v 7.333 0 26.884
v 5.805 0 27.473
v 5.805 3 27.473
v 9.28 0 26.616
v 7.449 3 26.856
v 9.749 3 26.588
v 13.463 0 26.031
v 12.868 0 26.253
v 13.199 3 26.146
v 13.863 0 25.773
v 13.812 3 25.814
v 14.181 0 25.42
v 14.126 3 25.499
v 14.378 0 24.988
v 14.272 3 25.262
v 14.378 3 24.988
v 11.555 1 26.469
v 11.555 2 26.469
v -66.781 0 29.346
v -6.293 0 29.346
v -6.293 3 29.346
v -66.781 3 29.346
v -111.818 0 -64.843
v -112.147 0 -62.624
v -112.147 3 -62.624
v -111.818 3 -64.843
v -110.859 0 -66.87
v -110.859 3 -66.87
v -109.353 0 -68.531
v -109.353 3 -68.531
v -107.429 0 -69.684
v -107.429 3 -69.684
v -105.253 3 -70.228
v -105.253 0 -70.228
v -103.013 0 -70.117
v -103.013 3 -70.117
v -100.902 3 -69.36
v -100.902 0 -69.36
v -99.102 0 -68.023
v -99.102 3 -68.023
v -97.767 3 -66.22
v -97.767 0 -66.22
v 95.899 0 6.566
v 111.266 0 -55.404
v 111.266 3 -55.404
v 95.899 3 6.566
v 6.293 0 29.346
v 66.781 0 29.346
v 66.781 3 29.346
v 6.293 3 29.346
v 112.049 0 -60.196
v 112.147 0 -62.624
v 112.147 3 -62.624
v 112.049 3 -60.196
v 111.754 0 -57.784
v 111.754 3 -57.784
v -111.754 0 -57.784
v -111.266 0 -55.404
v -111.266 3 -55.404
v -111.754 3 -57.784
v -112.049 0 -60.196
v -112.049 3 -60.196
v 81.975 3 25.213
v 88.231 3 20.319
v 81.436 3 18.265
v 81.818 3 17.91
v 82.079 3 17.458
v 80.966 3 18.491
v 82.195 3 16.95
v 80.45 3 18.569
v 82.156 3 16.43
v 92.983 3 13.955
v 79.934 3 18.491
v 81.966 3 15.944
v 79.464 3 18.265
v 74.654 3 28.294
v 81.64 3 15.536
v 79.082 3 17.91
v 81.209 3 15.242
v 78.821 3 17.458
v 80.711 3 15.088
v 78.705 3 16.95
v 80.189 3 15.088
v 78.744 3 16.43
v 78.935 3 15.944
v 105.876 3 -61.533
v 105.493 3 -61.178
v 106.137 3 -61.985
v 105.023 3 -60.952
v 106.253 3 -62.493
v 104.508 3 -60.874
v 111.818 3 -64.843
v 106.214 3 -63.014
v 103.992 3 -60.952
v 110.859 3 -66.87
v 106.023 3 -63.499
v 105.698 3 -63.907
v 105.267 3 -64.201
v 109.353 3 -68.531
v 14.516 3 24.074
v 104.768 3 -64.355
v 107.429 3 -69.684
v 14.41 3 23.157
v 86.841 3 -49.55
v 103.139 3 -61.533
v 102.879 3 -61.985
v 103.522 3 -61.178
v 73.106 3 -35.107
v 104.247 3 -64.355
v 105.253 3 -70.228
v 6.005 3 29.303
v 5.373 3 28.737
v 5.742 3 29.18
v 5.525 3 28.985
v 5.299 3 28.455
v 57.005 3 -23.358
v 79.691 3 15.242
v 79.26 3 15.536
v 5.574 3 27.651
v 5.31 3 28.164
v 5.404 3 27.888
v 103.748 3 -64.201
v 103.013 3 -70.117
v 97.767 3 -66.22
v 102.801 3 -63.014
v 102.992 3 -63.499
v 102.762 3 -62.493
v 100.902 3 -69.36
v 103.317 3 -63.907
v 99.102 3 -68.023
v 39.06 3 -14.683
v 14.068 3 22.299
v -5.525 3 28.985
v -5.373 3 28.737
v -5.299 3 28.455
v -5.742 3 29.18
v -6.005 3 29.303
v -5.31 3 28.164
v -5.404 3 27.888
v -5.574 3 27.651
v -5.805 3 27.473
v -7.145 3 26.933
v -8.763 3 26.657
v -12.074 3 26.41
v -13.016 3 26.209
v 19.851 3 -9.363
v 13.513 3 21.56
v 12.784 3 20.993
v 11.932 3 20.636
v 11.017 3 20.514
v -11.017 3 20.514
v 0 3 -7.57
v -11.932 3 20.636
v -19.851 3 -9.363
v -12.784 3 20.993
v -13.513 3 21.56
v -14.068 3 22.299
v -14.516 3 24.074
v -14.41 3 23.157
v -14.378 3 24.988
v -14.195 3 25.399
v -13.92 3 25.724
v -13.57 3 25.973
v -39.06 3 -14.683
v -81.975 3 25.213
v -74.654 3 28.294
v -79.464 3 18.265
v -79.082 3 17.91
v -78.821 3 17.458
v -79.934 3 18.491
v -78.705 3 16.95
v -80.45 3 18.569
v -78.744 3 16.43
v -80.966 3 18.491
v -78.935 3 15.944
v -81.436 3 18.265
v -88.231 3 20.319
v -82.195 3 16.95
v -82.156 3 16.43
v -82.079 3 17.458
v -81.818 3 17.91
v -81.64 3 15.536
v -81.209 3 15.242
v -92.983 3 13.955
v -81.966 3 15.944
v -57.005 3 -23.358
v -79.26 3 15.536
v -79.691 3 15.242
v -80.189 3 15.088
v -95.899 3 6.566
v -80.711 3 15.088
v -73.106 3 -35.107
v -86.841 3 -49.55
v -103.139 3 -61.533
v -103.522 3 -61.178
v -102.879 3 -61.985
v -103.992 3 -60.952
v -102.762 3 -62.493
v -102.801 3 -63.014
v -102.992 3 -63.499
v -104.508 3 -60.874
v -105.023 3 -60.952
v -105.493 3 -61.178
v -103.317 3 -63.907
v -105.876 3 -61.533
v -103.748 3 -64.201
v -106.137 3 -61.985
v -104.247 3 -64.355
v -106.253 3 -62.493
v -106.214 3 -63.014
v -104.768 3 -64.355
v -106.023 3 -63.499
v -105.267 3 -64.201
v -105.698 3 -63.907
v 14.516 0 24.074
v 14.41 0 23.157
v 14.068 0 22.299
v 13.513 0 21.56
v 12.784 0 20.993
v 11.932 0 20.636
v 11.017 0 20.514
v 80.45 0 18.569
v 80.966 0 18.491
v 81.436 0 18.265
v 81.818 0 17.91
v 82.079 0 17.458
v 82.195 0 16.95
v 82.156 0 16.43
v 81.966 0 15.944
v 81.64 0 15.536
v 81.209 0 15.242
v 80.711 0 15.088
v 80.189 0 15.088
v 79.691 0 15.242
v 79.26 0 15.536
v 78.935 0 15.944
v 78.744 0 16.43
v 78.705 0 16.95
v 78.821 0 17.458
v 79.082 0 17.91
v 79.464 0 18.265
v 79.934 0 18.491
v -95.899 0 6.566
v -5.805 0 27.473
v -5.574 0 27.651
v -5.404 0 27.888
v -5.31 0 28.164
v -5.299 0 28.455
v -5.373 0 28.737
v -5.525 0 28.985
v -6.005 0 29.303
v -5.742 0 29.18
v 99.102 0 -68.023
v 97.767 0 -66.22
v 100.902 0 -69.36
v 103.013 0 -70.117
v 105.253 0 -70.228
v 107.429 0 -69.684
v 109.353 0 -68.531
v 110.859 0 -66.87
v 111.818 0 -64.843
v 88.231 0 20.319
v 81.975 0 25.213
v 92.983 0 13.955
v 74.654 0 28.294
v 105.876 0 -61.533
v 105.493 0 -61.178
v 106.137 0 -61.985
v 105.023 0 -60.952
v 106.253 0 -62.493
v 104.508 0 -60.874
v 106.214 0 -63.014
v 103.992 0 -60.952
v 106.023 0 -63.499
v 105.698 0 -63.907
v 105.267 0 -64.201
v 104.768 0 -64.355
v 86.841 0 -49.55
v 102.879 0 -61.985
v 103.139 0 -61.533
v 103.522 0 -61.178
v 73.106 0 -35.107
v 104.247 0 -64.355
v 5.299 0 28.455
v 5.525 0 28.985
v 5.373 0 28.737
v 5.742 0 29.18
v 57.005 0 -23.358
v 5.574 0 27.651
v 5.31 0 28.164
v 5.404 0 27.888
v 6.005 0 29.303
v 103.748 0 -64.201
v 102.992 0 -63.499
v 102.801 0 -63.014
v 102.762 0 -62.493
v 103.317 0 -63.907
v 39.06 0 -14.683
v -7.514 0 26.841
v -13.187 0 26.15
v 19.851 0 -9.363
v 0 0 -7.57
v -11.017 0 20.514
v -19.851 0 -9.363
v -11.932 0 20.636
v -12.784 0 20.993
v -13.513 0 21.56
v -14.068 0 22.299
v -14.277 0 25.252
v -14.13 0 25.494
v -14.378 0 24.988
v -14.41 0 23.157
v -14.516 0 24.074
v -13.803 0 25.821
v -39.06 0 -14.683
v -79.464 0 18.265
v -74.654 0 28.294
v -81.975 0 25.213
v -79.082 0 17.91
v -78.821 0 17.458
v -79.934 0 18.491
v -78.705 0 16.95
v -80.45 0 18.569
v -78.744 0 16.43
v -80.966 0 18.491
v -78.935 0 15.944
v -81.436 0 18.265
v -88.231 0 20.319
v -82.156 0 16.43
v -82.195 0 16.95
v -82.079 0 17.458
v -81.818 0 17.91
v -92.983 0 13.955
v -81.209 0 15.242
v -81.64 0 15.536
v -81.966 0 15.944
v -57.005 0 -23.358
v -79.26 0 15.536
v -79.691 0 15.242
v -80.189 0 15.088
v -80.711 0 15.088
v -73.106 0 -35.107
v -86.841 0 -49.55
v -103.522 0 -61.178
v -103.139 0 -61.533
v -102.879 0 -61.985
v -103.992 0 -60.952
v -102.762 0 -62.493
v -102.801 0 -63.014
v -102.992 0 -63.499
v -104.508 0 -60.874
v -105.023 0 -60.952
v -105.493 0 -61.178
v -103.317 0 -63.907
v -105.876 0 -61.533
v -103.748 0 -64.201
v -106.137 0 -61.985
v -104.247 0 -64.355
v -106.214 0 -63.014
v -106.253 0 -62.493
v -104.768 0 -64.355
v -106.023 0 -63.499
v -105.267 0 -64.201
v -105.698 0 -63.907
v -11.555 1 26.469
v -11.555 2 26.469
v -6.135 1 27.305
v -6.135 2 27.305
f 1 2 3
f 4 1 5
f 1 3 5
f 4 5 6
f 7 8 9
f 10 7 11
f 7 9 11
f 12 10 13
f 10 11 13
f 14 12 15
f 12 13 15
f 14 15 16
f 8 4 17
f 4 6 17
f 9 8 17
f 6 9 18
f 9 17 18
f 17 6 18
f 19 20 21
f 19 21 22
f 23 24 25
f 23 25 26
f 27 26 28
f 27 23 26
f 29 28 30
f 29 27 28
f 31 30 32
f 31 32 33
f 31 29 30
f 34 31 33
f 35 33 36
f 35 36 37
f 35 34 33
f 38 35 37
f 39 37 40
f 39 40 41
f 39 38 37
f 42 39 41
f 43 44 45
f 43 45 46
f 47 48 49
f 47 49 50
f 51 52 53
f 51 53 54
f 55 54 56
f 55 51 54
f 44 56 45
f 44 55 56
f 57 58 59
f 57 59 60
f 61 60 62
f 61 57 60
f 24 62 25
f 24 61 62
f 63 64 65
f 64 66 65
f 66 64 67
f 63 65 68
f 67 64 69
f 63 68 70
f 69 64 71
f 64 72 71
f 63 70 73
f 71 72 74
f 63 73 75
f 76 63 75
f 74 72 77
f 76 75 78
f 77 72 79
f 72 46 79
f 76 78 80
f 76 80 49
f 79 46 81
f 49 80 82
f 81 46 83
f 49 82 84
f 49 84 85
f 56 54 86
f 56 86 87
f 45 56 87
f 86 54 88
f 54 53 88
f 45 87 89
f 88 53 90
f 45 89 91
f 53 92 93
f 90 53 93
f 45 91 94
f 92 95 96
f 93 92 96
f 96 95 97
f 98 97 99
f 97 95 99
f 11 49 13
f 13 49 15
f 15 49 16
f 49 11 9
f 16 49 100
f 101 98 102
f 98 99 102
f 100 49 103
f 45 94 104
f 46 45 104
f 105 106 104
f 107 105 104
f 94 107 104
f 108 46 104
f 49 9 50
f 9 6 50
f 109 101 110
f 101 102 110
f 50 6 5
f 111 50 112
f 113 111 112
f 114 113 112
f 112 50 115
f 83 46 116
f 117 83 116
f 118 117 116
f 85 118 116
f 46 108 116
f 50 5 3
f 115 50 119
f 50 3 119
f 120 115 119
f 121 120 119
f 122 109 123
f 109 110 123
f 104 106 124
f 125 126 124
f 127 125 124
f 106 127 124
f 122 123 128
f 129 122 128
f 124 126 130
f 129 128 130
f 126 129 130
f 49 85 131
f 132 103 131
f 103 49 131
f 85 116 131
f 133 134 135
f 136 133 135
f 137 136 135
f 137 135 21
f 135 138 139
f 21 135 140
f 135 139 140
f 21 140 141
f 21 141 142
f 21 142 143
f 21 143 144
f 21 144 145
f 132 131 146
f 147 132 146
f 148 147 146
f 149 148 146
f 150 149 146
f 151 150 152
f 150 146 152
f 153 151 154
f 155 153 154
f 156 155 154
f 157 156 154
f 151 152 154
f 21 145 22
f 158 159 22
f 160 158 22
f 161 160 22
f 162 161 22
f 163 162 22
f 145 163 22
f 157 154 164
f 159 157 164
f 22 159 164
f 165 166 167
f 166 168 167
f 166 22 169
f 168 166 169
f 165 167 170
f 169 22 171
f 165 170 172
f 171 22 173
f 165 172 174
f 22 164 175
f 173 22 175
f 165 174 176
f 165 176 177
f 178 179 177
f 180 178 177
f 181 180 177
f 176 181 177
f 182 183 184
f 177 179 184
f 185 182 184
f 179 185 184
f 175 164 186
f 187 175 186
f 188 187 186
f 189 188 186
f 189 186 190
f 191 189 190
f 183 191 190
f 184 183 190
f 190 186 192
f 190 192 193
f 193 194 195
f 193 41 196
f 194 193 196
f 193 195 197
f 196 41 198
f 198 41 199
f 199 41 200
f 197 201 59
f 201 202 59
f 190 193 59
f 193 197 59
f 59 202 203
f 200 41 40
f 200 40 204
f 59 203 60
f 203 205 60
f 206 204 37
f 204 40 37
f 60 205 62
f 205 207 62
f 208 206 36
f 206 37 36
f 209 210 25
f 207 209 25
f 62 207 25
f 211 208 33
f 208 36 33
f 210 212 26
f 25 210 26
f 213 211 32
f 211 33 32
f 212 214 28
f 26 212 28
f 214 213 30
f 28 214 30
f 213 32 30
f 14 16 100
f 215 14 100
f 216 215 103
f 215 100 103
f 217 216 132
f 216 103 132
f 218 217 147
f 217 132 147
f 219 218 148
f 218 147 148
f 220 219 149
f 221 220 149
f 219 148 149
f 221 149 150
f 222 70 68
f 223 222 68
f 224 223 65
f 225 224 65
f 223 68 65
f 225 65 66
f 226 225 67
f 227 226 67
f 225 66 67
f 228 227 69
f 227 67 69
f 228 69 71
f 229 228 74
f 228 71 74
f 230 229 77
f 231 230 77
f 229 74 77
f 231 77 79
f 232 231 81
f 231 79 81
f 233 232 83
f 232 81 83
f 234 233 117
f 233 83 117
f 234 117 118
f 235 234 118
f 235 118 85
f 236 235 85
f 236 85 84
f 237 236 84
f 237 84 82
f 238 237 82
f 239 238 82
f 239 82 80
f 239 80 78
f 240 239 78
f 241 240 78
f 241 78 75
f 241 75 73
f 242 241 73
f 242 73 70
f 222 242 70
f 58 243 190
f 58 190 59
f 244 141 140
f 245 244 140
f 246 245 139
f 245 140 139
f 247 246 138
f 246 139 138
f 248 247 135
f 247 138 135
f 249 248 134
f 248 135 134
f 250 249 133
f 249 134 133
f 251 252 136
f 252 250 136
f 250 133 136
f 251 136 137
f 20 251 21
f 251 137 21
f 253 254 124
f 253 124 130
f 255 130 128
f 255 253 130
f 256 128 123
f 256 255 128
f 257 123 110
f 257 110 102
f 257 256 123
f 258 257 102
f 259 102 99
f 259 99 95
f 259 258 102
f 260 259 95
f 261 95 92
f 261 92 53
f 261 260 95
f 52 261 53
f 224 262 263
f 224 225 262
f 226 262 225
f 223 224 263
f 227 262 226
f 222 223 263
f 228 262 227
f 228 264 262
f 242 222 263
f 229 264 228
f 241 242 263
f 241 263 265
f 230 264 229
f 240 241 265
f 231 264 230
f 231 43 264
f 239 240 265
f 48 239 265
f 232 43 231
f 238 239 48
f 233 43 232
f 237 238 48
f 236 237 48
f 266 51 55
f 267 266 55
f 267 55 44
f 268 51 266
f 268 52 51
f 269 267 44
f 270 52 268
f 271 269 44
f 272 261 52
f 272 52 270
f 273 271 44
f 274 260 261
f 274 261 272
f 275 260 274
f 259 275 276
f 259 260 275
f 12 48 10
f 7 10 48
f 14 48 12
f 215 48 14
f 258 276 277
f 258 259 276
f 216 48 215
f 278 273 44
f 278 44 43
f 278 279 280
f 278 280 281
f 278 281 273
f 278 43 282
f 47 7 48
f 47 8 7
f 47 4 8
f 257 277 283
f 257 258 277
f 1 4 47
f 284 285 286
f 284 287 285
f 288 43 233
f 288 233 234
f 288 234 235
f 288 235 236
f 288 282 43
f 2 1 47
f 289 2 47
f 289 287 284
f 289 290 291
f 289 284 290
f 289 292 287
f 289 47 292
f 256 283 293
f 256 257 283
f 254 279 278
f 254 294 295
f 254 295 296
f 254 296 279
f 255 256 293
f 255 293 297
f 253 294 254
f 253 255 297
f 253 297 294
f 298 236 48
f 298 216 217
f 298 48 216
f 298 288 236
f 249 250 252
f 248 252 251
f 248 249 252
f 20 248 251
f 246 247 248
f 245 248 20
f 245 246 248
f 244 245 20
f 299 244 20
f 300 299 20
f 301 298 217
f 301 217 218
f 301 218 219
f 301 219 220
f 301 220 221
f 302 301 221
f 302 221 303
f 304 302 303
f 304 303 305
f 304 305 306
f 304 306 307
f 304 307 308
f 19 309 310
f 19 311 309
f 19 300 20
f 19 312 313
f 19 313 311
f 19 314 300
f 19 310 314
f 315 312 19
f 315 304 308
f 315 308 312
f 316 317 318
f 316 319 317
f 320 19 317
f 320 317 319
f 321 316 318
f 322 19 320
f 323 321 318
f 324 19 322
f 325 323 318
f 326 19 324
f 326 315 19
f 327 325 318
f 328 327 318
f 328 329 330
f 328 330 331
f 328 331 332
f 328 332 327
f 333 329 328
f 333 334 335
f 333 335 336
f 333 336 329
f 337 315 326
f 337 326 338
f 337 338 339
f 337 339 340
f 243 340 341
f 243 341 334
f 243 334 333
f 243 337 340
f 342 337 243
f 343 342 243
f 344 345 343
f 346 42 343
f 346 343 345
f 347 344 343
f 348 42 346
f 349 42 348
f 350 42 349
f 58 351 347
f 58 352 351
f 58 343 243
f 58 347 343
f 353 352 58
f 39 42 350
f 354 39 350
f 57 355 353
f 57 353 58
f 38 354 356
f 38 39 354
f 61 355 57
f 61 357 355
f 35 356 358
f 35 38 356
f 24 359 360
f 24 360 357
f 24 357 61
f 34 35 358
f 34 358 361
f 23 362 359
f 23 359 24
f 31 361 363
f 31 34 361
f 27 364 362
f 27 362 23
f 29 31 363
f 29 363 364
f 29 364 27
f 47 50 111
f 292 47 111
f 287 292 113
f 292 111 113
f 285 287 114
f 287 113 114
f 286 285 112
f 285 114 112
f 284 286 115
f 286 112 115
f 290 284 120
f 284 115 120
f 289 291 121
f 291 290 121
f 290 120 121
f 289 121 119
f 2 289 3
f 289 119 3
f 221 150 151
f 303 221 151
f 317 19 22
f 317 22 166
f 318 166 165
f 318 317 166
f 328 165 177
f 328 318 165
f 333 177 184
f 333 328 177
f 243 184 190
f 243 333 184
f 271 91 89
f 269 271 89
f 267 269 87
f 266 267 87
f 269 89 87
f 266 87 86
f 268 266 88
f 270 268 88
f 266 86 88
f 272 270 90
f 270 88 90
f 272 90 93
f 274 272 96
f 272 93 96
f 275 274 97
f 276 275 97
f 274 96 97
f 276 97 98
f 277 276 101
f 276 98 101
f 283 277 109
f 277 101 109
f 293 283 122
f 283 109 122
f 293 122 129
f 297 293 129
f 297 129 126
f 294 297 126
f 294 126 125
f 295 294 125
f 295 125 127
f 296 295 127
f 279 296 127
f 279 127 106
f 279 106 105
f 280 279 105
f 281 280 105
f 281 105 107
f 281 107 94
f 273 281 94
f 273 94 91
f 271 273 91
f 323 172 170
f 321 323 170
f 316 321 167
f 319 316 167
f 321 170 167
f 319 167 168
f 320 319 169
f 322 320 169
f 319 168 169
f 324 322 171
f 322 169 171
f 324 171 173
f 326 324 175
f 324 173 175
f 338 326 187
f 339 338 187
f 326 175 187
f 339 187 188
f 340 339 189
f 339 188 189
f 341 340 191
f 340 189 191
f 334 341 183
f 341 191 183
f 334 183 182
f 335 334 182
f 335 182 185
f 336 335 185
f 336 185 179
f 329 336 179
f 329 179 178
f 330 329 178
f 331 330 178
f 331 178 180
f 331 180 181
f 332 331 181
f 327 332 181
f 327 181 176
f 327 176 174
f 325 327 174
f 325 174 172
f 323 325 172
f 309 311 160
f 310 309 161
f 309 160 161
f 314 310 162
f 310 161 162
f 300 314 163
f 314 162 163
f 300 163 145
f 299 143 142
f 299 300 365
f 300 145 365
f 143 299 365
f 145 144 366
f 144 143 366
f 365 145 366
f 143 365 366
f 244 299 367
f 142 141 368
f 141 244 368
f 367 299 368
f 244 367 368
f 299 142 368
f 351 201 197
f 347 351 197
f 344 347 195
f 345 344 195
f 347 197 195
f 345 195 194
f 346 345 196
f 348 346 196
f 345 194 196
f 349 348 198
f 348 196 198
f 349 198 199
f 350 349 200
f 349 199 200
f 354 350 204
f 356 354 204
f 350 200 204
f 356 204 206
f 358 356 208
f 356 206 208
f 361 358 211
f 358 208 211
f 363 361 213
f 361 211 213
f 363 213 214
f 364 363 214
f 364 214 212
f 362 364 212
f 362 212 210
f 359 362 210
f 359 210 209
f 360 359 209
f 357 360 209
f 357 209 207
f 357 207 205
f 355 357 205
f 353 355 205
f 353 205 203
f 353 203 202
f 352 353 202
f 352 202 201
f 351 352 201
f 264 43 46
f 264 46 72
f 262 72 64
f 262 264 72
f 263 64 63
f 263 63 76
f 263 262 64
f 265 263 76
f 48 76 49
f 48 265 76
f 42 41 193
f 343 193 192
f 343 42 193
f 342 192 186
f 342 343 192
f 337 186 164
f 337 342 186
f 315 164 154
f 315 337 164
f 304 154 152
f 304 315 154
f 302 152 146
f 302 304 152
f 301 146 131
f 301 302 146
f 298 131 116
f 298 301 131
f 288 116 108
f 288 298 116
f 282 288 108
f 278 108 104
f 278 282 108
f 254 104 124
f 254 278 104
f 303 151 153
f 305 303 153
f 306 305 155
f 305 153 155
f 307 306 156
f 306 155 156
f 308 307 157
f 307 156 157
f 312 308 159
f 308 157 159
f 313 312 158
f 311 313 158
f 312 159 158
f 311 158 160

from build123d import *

# Parameters (mm, degrees)
EXTRUDE_1_DEPTH     = 3
CUT_EXTRUDE_START   = -10
CUT_EXTRUDE_1_DEPTH = 10
SKETCH_3_R          = 1.75
CUT_EXTRUDE_2_DEPTH = 10
CUT_EXTRUDE_3_DEPTH = 10


with BuildPart() as part:
    # 草图1 → 凸台-拉伸1 (new body)
    with BuildSketch(Plane(origin=(0, 0, 0), x_dir=(1, 0, 0), z_dir=(0, 1, 0))):
        with BuildLine():
            Line((-66.78059141, 154.593992167), (66.78059141, 154.593992167))
            ThreePointArc((66.78059141, 154.593992167), (85.265515034, 148.222525736), (95.898700635, 131.814498742))
            Line((95.898700635, 131.814498742), (111.265547961, 69.844672358))
            ThreePointArc((111.265547961, 69.844672358), (112.147438737, 62.624165782), (111.265547961, 55.403659207))
            Line((111.265547961, 55.403659207), (95.898700635, -6.566167178))
            ThreePointArc((95.898700635, -6.566167178), (85.265515034, -22.974194171), (66.78059141, -29.345660602))
            Line((66.78059141, -29.345660602), (-66.78059141, -29.345660602))
            ThreePointArc((-66.78059141, -29.345660602), (-85.265515034, -22.974194171), (-95.898700635, -6.566167178))
            Line((-95.898700635, -6.566167178), (-111.265547961, 55.403659207))
            ThreePointArc((-111.265547961, 55.403659207), (-112.147438737, 62.624165782), (-111.265547961, 69.844672358))
            Line((-111.265547961, 69.844672358), (-95.898700635, 131.814498742))
            ThreePointArc((-95.898700635, 131.814498742), (-85.265515034, 148.222525736), (-66.78059141, 154.593992167))
        make_face()
    extrude(amount=EXTRUDE_1_DEPTH)

    # 草图2 → 切除-拉伸1 (cut)
    with BuildSketch(Plane(origin=(0, 3, 0), x_dir=(1, 0, 0), z_dir=(0, 1, 0)).offset(CUT_EXTRUDE_START)):
        with BuildLine():
            Line((111.265547961, 69.844672358), (95.898700635, 131.814498742))
            ThreePointArc((95.898700635, 131.814498742), (85.265515034, 148.222525736), (66.78059141, 154.593992167))
            Line((66.78059141, 154.593992167), (-66.78059141, 154.593992167))
            ThreePointArc((-66.78059141, 154.593992167), (-85.265515034, 148.222525736), (-95.898700635, 131.814498742))
            Line((-95.898700635, 131.814498742), (-111.265547961, 69.844672358))
            ThreePointArc((-111.265547961, 69.844672358), (-111.926149897, 66.261247255), (-112.147438737, 62.624165782))
            ThreePointArc((-112.147438737, 62.624165782), (-106.361047775, 70.035823246), (-97.766986015, 66.220447882))
            ThreePointArc((-97.766986015, 66.220447882), (0, 7.570427798), (97.766986015, 66.220447882))
            ThreePointArc((97.766986015, 66.220447882), (106.361047775, 70.035823246), (112.147438737, 62.624165782))
            ThreePointArc((112.147438737, 62.624165782), (111.926149897, 66.261247255), (111.265547961, 69.844672358))
        make_face()
    extrude(amount=CUT_EXTRUDE_1_DEPTH, mode=Mode.SUBTRACT)

    # 草图3 → 切除-拉伸2 (cut)
    with BuildSketch(Plane(origin=(0, 3, 0), x_dir=(1, 0, 0), z_dir=(0, 1, 0))):
        with Locations(Location((-80.450184708, -16.818951307, 0), (0, 0, 270))):
            Circle(SKETCH_3_R)
        with Locations(Location((-104.507530951, 62.624165782, 0), (0, 0, 270))):
            Circle(SKETCH_3_R)
        with Locations(Location((104.507530951, 62.624165782, 0), (0, 0, 270))):
            Circle(SKETCH_3_R)
        with Locations(Location((80.450184708, -16.818951307, 0), (0, 0, 270))):
            Circle(SKETCH_3_R)
    extrude(amount=-CUT_EXTRUDE_2_DEPTH, mode=Mode.SUBTRACT)

    # 草图4 → 切除-拉伸3 (cut)
    with BuildSketch(Plane(origin=(0, 3, 0), x_dir=(1, 0, 0), z_dir=(0, 1, 0))):
        with BuildLine():
            Line((11.016648097, -20.513898252), (-11.016648097, -20.513898252))
            ThreePointArc((-11.016648097, -20.513898252), (-13.814702514, -21.911306641), (-14.378457093, -24.987674549))
            add(Edge.make_bspline(
                [(-14.378457093, -24.987674549), (-14.050661547, -26.11933694), (-10.489346867, -26.76009099), (-7.724749574, -26.493757466), (-5.904508816, -27.417302496), (-5.804576355, -27.473305111)],
                knots=[0, 0, 0, 0, 0.274123853, 0.745489655, 0.777393608, 0.777393608, 0.777393608, 0.777393608], degree=3))
            ThreePointArc((-5.804576355, -27.473305111), (-5.325885634, -28.59829127), (-6.293448421, -29.345660602))
            Line((-6.293448421, -29.345660602), (6.293448421, -29.345660602))
            ThreePointArc((6.293448421, -29.345660602), (5.325885634, -28.59829127), (5.804576355, -27.473305111))
            add(Edge.make_bspline(
                [(5.804576355, -27.473305111), (5.904508816, -27.417302496), (7.724749574, -26.493757466), (10.489346867, -26.76009099), (14.050661547, -26.11933694), (14.378457093, -24.987674549)],
                knots=[0, 0, 0, 0, 0.031903952, 0.503269754, 0.777393608, 0.777393608, 0.777393608, 0.777393608], degree=3))
            ThreePointArc((14.378457093, -24.987674549), (13.814702514, -21.911306641), (11.016648097, -20.513898252))
        make_face()
    extrude(amount=-CUT_EXTRUDE_3_DEPTH, mode=Mode.SUBTRACT)


solid = part.part
